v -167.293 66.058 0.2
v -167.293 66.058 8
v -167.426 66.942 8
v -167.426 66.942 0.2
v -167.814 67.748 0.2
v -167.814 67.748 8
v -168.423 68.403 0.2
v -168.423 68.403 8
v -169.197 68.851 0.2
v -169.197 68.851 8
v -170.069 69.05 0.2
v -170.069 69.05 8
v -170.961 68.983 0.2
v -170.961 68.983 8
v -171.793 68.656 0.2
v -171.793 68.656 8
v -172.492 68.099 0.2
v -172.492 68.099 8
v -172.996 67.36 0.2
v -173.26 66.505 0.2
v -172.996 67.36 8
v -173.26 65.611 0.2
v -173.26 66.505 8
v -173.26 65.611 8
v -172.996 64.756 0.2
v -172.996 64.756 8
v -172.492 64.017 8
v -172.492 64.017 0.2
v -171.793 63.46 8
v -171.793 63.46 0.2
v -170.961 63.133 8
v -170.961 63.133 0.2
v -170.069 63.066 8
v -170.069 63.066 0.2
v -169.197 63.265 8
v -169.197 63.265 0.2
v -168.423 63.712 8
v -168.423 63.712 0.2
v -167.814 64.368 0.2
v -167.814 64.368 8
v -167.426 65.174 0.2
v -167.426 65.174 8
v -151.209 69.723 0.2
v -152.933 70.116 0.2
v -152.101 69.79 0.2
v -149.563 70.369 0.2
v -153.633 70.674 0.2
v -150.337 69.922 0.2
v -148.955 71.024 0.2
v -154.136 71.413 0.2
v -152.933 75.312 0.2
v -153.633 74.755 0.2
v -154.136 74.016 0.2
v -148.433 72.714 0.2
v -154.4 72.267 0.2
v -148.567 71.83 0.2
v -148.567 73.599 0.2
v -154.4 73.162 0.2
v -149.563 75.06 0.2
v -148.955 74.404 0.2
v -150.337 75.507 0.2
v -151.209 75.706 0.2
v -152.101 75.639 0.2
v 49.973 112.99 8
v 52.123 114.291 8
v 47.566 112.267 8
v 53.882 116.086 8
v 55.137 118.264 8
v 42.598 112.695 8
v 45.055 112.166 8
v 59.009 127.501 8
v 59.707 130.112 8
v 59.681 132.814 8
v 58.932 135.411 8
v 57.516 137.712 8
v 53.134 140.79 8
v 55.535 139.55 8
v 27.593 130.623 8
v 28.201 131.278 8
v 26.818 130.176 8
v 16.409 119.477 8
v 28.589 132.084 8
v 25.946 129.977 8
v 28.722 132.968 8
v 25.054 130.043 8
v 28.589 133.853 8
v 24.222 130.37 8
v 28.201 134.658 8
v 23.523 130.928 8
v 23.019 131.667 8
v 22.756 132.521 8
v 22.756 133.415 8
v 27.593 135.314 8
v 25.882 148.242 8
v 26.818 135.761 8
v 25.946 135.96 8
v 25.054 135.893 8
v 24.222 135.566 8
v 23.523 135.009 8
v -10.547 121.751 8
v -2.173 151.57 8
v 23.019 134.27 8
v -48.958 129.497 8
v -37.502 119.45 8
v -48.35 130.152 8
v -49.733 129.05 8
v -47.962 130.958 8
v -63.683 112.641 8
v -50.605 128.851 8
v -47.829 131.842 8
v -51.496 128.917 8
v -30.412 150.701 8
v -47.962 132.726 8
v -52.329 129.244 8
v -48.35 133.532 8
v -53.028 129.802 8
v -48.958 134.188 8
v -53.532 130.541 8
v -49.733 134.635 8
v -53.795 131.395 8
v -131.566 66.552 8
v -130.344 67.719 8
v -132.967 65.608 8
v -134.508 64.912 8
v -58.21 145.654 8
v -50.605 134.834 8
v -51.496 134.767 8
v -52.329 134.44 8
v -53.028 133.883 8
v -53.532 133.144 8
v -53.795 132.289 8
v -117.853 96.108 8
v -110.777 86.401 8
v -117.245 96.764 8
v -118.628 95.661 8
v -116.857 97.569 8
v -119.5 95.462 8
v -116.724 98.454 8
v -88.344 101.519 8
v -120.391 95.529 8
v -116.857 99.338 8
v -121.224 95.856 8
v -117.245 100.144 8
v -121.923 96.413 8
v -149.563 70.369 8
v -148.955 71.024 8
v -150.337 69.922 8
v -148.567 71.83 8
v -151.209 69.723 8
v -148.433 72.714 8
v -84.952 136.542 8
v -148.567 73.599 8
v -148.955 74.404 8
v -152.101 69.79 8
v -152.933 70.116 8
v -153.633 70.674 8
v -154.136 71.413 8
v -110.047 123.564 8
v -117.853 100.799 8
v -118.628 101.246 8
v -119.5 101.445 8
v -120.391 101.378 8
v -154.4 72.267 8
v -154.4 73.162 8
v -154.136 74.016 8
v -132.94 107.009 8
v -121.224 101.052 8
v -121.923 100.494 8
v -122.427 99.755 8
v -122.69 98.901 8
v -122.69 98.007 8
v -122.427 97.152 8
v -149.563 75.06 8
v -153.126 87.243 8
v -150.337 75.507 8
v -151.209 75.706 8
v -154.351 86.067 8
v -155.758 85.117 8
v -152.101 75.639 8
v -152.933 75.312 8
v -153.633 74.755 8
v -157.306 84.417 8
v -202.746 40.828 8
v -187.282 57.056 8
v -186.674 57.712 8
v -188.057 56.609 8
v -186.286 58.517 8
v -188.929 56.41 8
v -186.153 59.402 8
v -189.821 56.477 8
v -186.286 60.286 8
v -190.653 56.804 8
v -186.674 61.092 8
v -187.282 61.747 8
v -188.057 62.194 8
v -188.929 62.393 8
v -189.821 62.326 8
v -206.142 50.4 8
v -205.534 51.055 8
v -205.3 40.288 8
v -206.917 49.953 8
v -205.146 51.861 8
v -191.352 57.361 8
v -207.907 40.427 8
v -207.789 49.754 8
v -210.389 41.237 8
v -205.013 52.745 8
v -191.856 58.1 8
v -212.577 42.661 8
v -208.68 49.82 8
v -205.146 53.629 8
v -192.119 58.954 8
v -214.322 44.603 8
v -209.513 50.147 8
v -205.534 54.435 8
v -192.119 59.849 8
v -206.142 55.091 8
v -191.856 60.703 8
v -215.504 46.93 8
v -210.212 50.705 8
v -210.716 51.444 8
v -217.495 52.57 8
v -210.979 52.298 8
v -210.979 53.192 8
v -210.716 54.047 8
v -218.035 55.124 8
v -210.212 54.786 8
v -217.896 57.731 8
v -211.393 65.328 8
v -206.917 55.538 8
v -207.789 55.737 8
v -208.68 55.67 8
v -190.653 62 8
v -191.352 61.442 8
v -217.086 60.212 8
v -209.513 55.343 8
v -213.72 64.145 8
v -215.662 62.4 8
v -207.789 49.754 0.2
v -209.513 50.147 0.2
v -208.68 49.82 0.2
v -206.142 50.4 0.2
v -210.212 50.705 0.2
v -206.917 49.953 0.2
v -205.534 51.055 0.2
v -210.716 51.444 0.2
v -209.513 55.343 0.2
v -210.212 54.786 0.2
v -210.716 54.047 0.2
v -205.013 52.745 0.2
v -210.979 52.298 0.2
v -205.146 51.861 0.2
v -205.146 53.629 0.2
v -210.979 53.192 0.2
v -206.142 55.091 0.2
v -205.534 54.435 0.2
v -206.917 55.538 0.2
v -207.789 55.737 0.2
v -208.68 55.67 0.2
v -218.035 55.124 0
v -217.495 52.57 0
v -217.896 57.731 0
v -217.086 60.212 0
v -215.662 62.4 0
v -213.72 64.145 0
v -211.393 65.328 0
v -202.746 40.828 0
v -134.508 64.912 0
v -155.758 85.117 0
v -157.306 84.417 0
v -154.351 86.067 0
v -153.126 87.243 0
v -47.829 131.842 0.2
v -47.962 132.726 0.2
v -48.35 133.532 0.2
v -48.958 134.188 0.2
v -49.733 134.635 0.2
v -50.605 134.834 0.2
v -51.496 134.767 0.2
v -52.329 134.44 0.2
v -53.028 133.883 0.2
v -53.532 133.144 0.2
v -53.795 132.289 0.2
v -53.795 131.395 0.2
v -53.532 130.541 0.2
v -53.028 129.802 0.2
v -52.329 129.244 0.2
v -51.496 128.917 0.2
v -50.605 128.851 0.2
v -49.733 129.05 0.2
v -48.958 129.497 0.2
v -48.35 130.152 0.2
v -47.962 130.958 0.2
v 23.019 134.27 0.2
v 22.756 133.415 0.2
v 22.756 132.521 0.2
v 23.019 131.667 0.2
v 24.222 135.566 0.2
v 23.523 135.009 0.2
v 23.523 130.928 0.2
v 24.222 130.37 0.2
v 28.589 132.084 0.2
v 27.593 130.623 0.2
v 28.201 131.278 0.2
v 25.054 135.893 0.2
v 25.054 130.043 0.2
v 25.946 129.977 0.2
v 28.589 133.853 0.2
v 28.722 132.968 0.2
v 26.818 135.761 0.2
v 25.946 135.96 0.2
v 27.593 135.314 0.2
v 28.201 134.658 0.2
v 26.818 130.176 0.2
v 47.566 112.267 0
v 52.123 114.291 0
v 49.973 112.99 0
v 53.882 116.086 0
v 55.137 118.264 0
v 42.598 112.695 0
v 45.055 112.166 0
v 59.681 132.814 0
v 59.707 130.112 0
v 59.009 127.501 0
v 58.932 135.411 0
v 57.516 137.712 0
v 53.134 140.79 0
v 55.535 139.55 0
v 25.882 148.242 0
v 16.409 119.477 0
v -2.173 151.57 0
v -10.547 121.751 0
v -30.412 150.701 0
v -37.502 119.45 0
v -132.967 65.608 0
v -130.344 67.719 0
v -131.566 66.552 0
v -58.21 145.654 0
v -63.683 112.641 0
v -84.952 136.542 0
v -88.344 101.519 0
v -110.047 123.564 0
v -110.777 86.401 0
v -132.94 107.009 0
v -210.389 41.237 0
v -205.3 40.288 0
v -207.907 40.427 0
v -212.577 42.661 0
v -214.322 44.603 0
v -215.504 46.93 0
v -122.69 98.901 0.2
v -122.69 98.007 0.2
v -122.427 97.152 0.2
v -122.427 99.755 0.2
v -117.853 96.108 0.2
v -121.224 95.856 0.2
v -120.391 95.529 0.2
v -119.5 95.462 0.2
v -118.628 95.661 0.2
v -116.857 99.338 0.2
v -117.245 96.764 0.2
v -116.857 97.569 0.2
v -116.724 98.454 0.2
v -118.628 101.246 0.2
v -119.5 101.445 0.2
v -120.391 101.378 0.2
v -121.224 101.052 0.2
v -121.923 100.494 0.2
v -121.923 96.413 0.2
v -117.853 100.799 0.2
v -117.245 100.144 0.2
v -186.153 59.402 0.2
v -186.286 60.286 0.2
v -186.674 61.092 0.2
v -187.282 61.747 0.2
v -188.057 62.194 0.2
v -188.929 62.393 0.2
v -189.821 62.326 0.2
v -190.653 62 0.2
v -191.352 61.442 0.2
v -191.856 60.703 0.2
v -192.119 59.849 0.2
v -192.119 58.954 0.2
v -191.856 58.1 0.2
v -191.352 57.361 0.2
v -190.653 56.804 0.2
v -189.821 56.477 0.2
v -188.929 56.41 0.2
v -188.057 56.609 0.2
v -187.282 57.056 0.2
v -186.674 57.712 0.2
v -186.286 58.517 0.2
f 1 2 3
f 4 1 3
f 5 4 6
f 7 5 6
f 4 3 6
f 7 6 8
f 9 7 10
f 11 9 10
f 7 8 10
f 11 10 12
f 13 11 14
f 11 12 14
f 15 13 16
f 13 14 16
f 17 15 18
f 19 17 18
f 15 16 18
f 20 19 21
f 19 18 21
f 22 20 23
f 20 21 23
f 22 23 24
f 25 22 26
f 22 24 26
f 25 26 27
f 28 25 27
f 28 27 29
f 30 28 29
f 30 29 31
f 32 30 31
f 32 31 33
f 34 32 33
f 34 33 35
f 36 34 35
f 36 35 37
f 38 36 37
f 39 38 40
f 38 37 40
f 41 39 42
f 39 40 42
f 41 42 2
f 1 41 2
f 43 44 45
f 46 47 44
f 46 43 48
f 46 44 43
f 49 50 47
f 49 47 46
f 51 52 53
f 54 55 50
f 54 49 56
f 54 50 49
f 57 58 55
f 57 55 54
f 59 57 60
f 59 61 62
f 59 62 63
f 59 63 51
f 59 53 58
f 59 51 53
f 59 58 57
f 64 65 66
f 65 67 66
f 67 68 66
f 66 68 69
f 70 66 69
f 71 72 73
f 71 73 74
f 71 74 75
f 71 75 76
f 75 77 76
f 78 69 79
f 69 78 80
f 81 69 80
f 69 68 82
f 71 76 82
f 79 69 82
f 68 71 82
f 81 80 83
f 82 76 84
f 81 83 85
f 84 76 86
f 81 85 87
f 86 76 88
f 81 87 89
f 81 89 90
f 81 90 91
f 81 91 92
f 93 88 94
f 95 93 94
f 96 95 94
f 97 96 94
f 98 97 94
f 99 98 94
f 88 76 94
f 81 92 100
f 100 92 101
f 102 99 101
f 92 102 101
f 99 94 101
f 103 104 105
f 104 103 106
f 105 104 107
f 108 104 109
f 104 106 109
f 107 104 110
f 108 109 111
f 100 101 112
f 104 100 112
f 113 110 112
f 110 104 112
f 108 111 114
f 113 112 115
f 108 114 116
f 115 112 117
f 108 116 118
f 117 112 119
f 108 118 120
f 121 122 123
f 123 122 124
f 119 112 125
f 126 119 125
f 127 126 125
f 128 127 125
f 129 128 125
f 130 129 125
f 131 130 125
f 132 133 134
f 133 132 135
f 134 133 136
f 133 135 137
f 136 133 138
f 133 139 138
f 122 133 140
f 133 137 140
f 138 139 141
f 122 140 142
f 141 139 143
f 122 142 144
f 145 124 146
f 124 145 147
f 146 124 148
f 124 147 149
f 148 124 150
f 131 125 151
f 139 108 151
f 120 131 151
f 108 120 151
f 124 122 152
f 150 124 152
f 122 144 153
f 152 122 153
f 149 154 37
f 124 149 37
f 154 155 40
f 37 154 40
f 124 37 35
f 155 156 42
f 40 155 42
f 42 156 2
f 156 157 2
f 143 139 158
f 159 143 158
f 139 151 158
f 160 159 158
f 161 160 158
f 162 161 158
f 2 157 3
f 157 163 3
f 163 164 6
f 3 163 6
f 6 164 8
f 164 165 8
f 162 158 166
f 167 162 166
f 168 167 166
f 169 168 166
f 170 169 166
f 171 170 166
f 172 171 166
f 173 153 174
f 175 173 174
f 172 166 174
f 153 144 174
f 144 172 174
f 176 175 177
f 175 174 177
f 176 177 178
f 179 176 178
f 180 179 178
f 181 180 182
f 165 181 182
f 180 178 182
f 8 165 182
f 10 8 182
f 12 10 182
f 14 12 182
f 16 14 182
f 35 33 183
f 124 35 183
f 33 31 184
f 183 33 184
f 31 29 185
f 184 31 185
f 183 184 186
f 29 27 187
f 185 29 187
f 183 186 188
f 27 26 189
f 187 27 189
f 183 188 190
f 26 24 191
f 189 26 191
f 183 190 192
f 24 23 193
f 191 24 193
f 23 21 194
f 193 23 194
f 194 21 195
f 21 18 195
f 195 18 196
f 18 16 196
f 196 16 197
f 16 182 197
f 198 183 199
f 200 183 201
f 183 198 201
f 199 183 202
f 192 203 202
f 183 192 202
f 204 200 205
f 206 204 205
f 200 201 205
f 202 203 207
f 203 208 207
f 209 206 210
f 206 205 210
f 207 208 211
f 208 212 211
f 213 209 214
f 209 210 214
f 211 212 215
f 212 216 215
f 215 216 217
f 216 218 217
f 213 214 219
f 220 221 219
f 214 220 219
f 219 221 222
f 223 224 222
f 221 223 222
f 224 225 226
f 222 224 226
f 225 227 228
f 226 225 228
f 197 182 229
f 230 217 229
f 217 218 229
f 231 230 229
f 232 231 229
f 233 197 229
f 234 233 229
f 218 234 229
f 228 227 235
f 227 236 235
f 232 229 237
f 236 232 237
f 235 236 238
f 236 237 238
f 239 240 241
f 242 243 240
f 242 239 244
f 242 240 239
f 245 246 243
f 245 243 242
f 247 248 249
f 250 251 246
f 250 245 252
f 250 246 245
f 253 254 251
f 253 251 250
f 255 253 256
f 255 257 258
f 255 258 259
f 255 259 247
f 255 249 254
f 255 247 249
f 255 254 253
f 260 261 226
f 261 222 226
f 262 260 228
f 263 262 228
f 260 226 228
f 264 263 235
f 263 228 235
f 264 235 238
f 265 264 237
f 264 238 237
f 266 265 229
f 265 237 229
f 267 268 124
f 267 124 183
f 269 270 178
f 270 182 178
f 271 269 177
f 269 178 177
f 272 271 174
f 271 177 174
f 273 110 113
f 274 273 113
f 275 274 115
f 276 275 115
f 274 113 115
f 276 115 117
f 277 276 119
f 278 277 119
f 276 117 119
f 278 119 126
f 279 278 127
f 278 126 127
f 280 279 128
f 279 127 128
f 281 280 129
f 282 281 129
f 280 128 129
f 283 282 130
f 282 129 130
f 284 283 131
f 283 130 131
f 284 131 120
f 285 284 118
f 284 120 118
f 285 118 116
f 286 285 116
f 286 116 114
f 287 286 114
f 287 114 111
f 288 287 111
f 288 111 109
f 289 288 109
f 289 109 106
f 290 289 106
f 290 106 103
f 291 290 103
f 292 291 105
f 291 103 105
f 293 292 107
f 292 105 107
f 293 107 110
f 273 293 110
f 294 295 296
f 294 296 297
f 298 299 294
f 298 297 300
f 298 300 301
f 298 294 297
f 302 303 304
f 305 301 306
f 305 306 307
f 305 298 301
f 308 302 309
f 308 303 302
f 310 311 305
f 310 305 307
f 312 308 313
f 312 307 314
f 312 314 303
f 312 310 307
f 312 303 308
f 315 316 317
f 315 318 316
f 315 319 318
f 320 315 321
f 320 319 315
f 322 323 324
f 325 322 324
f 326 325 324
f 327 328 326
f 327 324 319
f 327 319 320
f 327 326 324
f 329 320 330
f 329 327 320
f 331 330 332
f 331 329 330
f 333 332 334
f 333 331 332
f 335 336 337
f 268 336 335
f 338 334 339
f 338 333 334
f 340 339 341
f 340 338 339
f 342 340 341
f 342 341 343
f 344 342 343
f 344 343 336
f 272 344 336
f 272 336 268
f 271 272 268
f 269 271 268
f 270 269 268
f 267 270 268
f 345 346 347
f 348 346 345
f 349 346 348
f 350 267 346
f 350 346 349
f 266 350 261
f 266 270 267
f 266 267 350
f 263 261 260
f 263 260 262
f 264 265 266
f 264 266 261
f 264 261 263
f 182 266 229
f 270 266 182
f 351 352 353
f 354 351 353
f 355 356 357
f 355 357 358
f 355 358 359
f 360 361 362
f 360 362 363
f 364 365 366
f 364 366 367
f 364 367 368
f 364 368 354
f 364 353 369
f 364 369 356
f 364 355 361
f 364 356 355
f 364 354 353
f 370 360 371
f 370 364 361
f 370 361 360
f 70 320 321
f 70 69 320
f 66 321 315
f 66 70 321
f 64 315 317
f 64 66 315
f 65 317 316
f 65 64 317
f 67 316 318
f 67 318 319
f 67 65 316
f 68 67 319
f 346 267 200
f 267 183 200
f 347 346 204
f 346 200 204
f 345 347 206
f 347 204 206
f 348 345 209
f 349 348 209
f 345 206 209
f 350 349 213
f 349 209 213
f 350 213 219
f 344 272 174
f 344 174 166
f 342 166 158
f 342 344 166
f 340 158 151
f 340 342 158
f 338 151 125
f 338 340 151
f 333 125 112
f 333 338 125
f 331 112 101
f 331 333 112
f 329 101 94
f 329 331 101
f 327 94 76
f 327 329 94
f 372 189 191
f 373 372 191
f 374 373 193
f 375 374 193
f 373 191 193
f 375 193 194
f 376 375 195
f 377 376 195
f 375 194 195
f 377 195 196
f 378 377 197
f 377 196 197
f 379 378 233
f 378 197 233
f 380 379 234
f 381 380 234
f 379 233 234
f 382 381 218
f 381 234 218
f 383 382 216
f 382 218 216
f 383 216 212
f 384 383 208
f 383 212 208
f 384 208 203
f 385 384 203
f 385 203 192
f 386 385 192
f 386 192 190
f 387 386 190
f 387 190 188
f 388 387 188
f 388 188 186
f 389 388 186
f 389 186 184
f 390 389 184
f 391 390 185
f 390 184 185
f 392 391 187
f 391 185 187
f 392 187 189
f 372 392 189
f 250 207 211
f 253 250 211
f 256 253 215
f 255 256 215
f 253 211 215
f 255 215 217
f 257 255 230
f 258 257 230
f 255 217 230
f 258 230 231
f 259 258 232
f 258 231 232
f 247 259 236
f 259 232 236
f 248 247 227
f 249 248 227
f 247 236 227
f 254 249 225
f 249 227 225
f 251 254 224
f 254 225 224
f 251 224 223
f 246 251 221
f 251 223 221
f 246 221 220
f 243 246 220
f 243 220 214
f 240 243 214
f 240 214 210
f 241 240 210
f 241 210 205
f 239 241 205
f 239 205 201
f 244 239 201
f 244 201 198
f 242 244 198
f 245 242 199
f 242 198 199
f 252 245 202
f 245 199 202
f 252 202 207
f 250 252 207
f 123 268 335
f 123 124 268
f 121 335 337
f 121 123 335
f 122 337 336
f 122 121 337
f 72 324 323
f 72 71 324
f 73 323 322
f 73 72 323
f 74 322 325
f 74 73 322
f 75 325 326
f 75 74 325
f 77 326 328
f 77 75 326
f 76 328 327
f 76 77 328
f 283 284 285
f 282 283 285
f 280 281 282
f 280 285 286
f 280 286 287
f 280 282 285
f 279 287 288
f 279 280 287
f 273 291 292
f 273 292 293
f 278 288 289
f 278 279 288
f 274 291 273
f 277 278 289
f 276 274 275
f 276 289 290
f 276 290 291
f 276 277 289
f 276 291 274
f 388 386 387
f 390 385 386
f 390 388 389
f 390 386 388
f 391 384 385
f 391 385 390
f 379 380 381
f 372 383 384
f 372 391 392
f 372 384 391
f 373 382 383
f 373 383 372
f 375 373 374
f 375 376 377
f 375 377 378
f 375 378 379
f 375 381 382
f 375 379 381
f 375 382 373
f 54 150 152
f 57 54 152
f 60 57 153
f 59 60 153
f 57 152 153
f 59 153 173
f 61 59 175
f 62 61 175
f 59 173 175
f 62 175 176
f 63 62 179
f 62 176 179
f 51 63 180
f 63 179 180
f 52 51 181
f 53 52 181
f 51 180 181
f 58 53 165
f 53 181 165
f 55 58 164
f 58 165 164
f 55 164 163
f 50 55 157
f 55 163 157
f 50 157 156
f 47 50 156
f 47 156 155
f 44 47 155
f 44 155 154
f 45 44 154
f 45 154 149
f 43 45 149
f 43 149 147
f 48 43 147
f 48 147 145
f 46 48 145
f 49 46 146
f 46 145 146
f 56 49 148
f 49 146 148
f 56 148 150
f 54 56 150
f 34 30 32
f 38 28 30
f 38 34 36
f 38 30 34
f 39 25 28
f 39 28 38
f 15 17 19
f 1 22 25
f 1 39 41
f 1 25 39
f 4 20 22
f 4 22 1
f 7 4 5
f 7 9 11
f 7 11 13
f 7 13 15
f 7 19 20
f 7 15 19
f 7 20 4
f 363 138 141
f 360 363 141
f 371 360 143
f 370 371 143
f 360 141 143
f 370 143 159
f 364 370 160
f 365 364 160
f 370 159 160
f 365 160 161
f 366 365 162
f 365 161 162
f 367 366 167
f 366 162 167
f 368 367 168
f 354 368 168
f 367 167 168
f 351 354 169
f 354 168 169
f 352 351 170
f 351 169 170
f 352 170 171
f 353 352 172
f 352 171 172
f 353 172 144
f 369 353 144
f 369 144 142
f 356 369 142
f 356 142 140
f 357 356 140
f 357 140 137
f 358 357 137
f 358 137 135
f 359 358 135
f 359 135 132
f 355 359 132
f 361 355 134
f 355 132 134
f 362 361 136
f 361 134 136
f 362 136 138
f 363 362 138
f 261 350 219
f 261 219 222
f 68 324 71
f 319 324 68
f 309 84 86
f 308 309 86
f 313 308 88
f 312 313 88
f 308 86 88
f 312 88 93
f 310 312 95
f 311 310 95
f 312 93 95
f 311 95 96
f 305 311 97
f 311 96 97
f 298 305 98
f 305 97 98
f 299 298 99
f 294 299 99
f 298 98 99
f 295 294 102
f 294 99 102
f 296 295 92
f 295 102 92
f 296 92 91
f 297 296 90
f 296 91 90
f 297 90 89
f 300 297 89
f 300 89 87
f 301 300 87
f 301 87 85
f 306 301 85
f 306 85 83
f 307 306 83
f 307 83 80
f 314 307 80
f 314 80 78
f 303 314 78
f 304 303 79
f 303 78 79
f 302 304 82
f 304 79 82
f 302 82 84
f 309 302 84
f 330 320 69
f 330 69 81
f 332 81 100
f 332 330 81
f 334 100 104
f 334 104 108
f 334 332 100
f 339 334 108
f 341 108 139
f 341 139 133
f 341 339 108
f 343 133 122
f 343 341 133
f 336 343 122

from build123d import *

# Parameters (mm, degrees)
BOSS_EXTRUDE1_DEPTH = 8
SKETCH2_R           = 3
CUT_EXTRUDE1_DEPTH  = 7.8
FILLET1_R           = 10


with BuildPart() as part:
    # Sketch1 → Boss-Extrude1 (new body)
    with BuildSketch(Plane.XY):
        with BuildLine():
            Line((-132.022045573, 65.789710007), (-212.176223927, 37.5))
            Line((-212.176223927, 37.5), (-220.823144233, 61.999607532))
            Line((-220.823144233, 61.999607532), (-154.813820882, 85.297015774))
            ThreePointArc((-154.813820882, 85.297015774), (-54.334940348, 146.616935984), (62.982038035, 136.980306335))
            Line((62.982038035, 136.980306335), (51.384993515, 109.312481006))
            ThreePointArc((51.384993515, 109.312481006), (-47.408251439, 117.427537553), (-132.022045573, 65.789710007))
        make_face()
    extrude(amount=BOSS_EXTRUDE1_DEPTH)

    # Sketch2 → Cut-Extrude1 (cut)
    with BuildSketch(Plane.XY.offset(8)):
        with Locations((-208.012771078, 52.745184826)):
            Circle(SKETCH2_R)
        with Locations((-189.152964406, 59.40158718)):
            Circle(SKETCH2_R)
        with Locations((-170.293157734, 66.057989535)):
            Circle(SKETCH2_R)
        with Locations((-151.433351063, 72.71439189)):
            Circle(SKETCH2_R)
        with Locations((25.722042378, 132.968245202)):
            Circle(SKETCH2_R)
        with Locations((-50.828871081, 131.842192364)):
            Circle(SKETCH2_R)
        with Locations((-119.723860621, 98.45370988)):
            Circle(SKETCH2_R)
    extrude(amount=-CUT_EXTRUDE1_DEPTH, mode=Mode.SUBTRACT)

    # Fillet1
    fillet1_edges = [part.edges().sort_by_distance(p)[0] for p in [
        (-220.823144233, 61.999607532, 4),
        (-154.813820882, 85.297015774, 4),
        (62.982038035, 136.980306335, 4),
        (51.384993515, 109.312481006, 4),
        (-132.022045573, 65.789710007, 4),
        (-212.176223927, 37.5, 4),
    ]]
    fillet(fillet1_edges, radius=FILLET1_R)


solid = part.part
